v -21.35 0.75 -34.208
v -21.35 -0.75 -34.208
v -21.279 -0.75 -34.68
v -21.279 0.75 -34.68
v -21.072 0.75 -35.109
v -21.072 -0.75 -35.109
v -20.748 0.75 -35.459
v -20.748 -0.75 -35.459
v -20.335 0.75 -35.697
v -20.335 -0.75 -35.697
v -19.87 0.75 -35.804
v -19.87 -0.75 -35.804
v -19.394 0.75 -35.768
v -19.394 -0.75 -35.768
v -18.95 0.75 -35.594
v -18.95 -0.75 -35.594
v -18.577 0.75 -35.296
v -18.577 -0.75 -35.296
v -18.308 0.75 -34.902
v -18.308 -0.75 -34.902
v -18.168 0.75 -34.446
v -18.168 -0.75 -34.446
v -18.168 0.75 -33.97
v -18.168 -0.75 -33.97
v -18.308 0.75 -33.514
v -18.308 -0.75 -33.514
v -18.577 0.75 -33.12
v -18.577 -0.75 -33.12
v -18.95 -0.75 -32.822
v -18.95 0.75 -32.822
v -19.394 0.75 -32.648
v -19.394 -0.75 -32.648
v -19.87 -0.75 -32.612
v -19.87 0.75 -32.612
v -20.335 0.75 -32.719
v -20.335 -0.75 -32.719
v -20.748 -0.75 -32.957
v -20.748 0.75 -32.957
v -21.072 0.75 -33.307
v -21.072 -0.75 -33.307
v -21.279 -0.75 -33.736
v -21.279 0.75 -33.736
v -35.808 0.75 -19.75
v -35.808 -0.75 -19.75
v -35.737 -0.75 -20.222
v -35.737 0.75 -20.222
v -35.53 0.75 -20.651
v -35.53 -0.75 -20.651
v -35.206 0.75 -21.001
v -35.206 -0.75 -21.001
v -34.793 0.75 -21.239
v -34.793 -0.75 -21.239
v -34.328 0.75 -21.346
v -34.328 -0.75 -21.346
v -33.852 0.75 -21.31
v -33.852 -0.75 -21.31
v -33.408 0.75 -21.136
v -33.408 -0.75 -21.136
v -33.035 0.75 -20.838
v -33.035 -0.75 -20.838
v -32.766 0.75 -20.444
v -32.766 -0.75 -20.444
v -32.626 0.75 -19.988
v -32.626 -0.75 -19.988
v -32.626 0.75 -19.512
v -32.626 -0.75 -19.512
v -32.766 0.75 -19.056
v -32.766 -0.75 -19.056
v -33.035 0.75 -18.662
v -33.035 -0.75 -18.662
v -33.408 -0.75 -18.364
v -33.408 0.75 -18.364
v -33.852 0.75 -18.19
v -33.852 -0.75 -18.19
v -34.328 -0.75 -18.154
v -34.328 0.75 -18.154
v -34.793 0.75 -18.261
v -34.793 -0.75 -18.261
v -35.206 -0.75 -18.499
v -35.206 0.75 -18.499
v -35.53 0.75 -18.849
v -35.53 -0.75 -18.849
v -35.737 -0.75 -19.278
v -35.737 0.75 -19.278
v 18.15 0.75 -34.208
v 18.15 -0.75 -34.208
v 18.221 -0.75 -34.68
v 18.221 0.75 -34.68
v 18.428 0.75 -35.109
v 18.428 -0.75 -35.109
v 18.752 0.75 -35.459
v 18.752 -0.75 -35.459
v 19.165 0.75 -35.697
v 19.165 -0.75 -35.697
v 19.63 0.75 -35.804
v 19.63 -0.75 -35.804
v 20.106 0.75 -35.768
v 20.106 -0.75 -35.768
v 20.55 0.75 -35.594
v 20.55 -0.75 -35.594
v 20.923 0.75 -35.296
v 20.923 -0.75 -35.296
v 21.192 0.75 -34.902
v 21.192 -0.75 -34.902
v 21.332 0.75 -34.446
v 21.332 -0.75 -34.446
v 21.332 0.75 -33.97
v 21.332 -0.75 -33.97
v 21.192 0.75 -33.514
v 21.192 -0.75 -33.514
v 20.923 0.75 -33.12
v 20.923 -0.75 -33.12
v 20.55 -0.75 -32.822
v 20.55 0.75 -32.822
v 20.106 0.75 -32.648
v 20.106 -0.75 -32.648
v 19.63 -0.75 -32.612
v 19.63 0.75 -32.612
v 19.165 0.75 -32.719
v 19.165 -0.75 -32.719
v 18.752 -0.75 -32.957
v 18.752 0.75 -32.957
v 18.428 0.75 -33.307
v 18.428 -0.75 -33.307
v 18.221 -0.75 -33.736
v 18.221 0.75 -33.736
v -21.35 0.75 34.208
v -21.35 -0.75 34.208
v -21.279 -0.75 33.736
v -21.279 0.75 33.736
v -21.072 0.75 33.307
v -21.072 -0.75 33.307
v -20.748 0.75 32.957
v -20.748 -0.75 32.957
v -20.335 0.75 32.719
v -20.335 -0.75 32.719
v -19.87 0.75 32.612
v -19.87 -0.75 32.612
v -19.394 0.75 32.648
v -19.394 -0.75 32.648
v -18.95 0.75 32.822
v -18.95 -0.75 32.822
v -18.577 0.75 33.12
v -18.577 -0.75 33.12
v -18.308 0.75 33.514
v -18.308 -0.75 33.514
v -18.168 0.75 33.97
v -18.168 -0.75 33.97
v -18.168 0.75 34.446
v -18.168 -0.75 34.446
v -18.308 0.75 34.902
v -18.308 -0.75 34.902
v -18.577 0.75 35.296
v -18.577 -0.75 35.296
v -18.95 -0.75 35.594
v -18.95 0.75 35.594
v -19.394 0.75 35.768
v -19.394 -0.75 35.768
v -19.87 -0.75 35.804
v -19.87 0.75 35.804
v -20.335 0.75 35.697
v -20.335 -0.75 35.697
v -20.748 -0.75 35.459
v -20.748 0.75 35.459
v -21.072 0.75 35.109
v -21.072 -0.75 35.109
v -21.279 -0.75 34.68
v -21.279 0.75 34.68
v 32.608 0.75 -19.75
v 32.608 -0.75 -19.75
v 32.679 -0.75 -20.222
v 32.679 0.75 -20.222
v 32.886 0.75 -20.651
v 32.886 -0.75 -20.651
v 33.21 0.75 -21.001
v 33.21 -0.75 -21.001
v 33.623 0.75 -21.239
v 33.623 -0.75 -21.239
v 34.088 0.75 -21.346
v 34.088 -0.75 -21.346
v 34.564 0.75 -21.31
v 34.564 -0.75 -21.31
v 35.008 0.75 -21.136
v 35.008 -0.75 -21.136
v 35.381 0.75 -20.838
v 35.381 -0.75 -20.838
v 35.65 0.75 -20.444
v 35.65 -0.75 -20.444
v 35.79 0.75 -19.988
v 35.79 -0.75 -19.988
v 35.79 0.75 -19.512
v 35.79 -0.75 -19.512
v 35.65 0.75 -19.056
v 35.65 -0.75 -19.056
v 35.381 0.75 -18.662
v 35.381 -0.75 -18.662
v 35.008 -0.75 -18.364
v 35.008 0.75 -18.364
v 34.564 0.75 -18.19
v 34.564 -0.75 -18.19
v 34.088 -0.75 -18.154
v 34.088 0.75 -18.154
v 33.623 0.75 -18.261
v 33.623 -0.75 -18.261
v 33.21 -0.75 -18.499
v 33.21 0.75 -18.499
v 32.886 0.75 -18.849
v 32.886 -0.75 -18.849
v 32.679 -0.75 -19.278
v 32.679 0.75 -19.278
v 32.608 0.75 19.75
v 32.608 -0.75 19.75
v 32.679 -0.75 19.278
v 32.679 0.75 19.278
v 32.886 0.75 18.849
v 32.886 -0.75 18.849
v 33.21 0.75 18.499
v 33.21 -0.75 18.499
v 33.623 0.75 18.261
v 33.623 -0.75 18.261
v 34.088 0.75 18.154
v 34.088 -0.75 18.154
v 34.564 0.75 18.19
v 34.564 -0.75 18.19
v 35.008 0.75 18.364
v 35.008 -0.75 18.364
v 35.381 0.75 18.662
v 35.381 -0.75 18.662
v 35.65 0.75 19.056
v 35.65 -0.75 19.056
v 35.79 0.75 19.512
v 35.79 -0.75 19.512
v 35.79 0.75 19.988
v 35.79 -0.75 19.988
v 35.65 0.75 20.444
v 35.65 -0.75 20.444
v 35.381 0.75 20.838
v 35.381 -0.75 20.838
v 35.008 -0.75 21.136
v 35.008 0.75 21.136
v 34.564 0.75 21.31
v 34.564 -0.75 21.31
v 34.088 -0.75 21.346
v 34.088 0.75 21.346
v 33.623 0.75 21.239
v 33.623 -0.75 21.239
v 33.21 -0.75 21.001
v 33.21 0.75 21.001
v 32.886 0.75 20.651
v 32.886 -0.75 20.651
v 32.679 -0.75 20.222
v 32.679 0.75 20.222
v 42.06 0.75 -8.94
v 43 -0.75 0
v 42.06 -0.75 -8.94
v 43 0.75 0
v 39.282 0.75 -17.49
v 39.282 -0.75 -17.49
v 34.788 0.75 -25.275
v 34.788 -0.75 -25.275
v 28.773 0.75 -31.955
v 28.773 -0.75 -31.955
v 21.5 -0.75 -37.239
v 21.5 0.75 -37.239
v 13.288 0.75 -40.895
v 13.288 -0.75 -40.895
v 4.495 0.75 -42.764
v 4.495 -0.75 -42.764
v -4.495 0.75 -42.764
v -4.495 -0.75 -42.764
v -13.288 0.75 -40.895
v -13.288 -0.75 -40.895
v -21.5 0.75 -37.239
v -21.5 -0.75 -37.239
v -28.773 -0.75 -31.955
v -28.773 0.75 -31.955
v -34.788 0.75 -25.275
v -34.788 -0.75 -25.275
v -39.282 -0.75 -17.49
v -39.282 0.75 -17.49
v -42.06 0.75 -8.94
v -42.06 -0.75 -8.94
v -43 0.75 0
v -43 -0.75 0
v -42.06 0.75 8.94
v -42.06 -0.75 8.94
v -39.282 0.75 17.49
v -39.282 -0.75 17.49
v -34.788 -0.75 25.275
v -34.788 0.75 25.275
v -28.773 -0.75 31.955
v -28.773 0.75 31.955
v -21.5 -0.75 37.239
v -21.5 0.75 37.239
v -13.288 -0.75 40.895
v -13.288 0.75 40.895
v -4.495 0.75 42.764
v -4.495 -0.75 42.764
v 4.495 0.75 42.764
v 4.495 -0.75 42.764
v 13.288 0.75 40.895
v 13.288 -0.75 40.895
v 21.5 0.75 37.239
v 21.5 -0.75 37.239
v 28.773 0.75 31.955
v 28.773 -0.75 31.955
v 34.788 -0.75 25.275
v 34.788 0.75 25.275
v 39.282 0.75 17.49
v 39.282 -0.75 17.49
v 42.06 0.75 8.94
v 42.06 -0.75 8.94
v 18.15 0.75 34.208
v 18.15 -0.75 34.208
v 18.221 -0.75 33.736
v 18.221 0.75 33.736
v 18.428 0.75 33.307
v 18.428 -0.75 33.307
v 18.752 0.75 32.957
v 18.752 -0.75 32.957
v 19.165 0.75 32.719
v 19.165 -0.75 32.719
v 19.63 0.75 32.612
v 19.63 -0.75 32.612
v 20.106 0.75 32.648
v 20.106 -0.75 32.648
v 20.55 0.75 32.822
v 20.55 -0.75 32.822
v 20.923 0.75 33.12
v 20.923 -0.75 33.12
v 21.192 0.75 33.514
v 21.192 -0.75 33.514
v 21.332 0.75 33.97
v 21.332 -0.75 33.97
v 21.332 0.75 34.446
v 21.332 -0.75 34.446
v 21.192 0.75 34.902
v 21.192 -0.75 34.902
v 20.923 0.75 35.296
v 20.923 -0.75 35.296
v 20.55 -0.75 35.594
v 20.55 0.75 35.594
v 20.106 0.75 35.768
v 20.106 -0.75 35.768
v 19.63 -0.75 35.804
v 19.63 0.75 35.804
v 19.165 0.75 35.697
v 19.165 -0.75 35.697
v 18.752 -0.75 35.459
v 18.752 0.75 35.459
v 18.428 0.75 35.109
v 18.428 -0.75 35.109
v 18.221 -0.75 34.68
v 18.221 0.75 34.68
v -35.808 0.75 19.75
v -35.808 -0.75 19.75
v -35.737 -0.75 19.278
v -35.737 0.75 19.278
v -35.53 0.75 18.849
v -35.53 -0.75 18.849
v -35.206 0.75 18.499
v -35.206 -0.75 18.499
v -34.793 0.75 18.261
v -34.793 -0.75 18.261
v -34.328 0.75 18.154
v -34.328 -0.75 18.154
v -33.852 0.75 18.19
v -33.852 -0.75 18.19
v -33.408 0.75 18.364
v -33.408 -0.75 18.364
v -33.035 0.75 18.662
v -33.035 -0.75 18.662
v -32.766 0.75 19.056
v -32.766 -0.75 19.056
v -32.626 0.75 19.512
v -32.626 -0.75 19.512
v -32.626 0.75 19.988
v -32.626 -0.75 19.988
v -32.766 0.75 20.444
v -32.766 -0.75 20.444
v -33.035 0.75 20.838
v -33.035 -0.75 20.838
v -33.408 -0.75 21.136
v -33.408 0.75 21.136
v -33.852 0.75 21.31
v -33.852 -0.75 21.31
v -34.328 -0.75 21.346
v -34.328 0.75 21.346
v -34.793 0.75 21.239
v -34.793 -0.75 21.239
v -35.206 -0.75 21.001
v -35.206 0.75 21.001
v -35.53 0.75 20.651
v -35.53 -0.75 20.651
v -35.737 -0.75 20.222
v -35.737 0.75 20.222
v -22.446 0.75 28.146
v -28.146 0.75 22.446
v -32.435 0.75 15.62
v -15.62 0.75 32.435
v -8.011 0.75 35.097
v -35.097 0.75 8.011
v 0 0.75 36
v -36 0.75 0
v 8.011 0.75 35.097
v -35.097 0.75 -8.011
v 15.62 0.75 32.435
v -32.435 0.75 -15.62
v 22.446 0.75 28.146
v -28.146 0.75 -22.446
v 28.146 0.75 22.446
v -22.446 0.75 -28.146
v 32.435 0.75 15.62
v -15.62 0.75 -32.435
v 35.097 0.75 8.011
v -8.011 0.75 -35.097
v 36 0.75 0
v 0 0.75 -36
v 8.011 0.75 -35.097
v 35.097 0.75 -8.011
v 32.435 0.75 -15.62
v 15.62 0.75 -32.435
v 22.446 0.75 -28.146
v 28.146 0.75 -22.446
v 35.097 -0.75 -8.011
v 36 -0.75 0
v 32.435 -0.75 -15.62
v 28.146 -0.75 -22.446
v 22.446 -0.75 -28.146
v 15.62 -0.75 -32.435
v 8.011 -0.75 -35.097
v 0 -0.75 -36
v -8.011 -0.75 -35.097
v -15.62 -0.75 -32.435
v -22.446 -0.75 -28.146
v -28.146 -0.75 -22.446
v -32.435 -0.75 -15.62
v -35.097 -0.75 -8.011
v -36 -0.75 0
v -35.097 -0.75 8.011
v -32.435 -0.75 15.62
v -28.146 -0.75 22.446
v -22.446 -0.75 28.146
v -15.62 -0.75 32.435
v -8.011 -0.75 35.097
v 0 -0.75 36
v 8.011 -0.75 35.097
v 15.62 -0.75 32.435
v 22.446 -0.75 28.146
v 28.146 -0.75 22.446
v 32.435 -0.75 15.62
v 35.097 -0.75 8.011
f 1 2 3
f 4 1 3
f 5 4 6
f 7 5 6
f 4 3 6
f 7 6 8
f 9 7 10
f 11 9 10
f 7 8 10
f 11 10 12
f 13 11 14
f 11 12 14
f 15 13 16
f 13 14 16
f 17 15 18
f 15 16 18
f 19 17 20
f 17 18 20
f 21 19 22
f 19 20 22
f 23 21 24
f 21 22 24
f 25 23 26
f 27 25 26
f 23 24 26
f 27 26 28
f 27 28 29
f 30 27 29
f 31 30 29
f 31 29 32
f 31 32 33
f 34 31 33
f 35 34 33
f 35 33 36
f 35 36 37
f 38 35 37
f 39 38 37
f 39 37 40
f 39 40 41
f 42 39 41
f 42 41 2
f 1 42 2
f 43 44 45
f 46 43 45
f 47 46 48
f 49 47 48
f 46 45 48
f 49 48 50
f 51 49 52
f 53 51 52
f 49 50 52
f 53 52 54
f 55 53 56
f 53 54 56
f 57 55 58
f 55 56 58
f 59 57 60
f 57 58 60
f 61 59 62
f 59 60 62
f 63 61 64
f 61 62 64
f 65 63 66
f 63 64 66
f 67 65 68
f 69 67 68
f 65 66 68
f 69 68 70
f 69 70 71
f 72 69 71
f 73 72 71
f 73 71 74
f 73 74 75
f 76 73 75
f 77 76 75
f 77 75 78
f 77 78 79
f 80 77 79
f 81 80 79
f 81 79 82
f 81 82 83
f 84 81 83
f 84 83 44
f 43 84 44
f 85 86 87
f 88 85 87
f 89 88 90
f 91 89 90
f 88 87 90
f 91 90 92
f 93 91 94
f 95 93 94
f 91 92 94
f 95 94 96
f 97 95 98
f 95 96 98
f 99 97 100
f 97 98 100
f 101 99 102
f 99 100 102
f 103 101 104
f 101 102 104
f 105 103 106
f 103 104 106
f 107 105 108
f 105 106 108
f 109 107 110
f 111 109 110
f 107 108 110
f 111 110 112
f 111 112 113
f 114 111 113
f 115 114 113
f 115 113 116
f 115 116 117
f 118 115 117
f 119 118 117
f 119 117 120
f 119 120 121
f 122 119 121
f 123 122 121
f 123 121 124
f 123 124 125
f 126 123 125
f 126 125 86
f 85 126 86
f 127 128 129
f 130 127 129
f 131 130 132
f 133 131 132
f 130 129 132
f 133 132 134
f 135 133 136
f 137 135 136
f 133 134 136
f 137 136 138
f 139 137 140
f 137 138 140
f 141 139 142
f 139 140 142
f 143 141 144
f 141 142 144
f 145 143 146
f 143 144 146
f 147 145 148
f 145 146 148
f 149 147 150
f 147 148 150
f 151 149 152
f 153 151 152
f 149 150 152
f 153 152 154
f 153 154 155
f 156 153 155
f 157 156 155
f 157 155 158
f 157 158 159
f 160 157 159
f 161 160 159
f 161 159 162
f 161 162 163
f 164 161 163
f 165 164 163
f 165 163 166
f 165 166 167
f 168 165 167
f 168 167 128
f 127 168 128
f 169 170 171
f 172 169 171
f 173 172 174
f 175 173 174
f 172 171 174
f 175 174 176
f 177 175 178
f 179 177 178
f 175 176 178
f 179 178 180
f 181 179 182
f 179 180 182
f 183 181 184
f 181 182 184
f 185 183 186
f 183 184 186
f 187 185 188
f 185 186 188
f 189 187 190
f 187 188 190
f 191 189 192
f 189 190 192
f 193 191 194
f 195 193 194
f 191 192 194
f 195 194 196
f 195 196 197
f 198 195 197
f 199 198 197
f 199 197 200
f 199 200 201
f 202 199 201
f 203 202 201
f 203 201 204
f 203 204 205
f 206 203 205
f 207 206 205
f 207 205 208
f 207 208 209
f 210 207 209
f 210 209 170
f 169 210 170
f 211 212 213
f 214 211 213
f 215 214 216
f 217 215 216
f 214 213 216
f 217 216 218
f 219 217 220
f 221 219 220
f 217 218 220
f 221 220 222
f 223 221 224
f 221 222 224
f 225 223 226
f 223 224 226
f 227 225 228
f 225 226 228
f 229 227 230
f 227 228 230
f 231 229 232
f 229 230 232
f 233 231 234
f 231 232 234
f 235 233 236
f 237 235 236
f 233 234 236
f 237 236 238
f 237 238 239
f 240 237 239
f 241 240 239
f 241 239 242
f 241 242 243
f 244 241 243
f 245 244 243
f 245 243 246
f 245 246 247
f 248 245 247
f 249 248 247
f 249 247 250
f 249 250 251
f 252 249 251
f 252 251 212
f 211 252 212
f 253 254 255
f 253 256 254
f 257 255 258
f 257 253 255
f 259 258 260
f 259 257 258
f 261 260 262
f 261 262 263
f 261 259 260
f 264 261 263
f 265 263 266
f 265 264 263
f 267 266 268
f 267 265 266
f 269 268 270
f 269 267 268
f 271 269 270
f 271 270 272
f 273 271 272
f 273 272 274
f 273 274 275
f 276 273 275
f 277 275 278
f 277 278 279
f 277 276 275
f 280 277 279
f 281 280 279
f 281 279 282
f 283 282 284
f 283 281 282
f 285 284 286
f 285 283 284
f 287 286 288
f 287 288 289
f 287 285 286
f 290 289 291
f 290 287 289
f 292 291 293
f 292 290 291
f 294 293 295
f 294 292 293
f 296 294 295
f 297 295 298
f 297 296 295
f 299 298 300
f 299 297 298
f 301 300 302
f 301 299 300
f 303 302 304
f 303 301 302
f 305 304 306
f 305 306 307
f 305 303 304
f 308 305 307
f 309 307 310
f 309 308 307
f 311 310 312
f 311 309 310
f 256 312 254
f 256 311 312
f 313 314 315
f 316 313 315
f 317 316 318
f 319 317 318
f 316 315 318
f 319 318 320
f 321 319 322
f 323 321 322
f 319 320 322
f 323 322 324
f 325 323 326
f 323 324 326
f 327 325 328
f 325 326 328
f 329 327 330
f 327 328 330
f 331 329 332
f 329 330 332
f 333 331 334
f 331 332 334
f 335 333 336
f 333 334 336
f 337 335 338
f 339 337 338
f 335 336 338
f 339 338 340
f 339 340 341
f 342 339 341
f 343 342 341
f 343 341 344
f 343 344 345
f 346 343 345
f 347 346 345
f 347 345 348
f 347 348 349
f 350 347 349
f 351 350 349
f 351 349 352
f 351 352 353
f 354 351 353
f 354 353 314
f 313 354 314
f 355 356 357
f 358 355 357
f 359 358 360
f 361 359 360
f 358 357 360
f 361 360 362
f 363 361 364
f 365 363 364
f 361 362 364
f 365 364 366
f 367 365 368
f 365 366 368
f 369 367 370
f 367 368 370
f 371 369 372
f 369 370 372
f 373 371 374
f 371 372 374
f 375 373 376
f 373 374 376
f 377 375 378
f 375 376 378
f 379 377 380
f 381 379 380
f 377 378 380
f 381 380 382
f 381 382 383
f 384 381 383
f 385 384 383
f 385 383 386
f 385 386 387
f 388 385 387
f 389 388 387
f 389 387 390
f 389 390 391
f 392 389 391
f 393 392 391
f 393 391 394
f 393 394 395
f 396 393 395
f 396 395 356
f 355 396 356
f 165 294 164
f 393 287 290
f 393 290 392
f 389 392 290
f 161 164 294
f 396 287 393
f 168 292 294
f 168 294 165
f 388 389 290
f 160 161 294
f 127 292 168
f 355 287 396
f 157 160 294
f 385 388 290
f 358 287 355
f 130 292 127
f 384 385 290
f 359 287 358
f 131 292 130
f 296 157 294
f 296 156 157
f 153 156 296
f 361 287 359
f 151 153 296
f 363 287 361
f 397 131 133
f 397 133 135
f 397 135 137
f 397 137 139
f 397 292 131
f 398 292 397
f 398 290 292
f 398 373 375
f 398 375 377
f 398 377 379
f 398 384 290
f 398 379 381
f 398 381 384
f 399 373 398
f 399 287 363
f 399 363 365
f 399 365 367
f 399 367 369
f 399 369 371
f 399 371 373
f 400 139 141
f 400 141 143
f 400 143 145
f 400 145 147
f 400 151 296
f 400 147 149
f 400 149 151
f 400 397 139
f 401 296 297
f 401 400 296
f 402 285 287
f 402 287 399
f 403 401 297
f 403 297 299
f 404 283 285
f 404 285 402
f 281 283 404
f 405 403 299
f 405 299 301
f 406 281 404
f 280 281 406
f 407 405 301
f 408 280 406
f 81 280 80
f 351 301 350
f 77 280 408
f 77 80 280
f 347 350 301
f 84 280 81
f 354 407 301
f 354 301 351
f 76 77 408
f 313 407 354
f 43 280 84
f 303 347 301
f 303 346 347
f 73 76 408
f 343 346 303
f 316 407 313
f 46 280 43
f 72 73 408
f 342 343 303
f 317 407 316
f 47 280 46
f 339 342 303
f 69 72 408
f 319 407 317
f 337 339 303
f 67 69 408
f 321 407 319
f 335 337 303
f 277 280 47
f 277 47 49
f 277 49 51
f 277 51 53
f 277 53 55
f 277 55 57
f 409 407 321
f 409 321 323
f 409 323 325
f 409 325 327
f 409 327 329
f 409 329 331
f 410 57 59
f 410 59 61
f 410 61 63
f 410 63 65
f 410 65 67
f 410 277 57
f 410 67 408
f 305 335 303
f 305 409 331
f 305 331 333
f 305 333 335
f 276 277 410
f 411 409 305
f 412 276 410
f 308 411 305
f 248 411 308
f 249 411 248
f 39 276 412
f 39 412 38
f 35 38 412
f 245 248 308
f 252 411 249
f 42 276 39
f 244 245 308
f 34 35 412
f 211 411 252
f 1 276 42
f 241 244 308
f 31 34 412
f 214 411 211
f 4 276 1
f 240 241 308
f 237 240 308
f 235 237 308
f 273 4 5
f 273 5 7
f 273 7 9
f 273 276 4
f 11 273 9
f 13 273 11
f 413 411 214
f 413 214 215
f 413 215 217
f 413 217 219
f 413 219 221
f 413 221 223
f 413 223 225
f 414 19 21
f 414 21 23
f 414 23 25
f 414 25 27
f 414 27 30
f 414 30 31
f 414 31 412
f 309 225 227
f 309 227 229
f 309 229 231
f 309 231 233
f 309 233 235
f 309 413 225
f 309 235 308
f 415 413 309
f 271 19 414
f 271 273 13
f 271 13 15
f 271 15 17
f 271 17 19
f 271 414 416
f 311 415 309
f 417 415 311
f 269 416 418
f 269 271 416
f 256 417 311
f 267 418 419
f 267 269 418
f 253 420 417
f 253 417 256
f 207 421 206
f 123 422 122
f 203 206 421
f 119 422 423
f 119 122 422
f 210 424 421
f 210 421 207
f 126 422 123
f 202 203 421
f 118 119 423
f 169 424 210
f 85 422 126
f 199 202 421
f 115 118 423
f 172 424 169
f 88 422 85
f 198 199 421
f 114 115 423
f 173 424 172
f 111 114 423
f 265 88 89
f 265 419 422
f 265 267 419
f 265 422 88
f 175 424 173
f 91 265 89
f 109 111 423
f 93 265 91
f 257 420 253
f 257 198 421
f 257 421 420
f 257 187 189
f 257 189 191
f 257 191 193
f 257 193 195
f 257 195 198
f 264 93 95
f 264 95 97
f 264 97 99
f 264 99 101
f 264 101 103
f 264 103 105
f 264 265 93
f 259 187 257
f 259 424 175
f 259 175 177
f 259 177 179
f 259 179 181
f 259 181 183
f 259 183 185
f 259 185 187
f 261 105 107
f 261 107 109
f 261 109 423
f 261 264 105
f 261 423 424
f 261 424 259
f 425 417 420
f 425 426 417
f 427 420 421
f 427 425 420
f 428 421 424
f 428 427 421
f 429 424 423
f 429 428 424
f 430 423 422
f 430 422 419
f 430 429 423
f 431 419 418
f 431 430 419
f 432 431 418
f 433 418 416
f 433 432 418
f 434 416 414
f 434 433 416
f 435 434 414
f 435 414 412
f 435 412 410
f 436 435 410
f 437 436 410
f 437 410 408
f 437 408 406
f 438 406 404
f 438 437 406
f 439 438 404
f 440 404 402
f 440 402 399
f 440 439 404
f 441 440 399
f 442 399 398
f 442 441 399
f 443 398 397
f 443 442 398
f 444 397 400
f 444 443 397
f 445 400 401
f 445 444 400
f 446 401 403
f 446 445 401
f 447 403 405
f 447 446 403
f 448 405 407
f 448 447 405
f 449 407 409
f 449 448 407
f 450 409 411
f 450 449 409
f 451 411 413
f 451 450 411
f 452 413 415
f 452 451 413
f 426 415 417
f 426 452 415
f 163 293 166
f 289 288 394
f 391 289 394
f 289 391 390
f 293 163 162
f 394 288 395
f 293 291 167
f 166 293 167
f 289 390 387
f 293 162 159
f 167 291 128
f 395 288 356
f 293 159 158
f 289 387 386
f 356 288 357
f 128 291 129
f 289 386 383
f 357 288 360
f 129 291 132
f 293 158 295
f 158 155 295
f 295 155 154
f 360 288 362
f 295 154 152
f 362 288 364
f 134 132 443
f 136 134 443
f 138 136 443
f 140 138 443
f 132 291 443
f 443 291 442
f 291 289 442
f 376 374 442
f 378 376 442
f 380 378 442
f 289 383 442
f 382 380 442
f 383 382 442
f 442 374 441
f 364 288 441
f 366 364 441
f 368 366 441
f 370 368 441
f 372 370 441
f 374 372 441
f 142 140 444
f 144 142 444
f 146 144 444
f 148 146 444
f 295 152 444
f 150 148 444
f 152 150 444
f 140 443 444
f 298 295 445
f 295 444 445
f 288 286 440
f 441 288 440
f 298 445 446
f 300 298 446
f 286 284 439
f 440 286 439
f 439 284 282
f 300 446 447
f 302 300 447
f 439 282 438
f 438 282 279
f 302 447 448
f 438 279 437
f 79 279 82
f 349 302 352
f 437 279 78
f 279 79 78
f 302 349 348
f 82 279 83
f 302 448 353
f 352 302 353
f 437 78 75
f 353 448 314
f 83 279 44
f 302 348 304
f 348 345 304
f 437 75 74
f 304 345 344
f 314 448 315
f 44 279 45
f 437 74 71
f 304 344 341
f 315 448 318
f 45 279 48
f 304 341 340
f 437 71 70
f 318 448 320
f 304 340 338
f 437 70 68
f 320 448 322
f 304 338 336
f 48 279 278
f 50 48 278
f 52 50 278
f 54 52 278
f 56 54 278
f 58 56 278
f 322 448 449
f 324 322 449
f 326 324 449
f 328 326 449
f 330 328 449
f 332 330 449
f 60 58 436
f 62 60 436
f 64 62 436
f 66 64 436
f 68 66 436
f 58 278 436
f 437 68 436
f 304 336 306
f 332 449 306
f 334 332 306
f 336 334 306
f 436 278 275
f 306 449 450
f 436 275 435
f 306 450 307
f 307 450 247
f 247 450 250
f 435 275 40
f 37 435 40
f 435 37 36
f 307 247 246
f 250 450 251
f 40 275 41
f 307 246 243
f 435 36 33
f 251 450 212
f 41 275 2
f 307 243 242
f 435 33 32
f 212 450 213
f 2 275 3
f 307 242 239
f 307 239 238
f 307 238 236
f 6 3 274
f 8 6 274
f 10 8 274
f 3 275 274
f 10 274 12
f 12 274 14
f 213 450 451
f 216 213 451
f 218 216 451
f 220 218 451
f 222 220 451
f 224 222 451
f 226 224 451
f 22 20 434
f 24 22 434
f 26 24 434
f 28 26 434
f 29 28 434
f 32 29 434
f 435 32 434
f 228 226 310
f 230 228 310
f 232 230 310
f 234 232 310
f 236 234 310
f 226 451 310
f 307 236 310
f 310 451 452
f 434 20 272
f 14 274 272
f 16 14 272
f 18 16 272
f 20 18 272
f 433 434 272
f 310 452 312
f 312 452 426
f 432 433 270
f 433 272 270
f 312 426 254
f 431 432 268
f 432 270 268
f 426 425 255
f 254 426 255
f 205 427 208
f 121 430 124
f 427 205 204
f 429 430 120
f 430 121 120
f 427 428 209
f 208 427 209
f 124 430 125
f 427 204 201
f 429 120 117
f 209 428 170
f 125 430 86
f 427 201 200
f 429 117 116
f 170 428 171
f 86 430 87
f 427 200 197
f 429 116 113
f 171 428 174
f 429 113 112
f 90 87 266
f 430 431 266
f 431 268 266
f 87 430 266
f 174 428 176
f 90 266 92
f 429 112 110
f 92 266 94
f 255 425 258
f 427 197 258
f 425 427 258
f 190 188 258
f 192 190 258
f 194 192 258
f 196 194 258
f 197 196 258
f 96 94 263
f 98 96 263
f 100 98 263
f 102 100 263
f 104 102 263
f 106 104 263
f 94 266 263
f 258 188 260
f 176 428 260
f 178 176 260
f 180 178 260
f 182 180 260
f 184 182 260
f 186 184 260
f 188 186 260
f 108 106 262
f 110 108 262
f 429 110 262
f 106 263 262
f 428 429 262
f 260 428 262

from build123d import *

# Parameters (mm, degrees)
SKETCH1_R                  = 43
SKETCH1_R_2                = 36
BOSS_EXTRUDE1_DEPTH        = 0.75
F_3_2_3_2_DIAMETER_HOLE1_D = 3.2


with BuildPart() as part:
    # Sketch1 → Boss-Extrude1 (new body, symmetric)
    with BuildSketch(Plane(origin=(0, 0, 0), x_dir=(1, 0, 0), z_dir=(0, 1, 0))):
        Circle(SKETCH1_R)
        Circle(SKETCH1_R_2, mode=Mode.SUBTRACT)
    extrude(amount=BOSS_EXTRUDE1_DEPTH, both=True)

    # Ø3.2 (3.2) Diameter Hole1 (through all)
    with Locations(Plane(origin=(0, 0.75, 0), x_dir=(1, 0, 0), z_dir=(0, 1, 0))):
        with Locations((-34.208003449, -19.75), (-34.208003449, 19.75), (-19.75, 34.208003449), (19.75, 34.208003449), (34.208003449, 19.75), (34.208003449, -19.75), (19.75, -34.208003449), (-19.75, -34.208003449), (0, 0)):
            Hole(F_3_2_3_2_DIAMETER_HOLE1_D / 2)


solid = part.part
